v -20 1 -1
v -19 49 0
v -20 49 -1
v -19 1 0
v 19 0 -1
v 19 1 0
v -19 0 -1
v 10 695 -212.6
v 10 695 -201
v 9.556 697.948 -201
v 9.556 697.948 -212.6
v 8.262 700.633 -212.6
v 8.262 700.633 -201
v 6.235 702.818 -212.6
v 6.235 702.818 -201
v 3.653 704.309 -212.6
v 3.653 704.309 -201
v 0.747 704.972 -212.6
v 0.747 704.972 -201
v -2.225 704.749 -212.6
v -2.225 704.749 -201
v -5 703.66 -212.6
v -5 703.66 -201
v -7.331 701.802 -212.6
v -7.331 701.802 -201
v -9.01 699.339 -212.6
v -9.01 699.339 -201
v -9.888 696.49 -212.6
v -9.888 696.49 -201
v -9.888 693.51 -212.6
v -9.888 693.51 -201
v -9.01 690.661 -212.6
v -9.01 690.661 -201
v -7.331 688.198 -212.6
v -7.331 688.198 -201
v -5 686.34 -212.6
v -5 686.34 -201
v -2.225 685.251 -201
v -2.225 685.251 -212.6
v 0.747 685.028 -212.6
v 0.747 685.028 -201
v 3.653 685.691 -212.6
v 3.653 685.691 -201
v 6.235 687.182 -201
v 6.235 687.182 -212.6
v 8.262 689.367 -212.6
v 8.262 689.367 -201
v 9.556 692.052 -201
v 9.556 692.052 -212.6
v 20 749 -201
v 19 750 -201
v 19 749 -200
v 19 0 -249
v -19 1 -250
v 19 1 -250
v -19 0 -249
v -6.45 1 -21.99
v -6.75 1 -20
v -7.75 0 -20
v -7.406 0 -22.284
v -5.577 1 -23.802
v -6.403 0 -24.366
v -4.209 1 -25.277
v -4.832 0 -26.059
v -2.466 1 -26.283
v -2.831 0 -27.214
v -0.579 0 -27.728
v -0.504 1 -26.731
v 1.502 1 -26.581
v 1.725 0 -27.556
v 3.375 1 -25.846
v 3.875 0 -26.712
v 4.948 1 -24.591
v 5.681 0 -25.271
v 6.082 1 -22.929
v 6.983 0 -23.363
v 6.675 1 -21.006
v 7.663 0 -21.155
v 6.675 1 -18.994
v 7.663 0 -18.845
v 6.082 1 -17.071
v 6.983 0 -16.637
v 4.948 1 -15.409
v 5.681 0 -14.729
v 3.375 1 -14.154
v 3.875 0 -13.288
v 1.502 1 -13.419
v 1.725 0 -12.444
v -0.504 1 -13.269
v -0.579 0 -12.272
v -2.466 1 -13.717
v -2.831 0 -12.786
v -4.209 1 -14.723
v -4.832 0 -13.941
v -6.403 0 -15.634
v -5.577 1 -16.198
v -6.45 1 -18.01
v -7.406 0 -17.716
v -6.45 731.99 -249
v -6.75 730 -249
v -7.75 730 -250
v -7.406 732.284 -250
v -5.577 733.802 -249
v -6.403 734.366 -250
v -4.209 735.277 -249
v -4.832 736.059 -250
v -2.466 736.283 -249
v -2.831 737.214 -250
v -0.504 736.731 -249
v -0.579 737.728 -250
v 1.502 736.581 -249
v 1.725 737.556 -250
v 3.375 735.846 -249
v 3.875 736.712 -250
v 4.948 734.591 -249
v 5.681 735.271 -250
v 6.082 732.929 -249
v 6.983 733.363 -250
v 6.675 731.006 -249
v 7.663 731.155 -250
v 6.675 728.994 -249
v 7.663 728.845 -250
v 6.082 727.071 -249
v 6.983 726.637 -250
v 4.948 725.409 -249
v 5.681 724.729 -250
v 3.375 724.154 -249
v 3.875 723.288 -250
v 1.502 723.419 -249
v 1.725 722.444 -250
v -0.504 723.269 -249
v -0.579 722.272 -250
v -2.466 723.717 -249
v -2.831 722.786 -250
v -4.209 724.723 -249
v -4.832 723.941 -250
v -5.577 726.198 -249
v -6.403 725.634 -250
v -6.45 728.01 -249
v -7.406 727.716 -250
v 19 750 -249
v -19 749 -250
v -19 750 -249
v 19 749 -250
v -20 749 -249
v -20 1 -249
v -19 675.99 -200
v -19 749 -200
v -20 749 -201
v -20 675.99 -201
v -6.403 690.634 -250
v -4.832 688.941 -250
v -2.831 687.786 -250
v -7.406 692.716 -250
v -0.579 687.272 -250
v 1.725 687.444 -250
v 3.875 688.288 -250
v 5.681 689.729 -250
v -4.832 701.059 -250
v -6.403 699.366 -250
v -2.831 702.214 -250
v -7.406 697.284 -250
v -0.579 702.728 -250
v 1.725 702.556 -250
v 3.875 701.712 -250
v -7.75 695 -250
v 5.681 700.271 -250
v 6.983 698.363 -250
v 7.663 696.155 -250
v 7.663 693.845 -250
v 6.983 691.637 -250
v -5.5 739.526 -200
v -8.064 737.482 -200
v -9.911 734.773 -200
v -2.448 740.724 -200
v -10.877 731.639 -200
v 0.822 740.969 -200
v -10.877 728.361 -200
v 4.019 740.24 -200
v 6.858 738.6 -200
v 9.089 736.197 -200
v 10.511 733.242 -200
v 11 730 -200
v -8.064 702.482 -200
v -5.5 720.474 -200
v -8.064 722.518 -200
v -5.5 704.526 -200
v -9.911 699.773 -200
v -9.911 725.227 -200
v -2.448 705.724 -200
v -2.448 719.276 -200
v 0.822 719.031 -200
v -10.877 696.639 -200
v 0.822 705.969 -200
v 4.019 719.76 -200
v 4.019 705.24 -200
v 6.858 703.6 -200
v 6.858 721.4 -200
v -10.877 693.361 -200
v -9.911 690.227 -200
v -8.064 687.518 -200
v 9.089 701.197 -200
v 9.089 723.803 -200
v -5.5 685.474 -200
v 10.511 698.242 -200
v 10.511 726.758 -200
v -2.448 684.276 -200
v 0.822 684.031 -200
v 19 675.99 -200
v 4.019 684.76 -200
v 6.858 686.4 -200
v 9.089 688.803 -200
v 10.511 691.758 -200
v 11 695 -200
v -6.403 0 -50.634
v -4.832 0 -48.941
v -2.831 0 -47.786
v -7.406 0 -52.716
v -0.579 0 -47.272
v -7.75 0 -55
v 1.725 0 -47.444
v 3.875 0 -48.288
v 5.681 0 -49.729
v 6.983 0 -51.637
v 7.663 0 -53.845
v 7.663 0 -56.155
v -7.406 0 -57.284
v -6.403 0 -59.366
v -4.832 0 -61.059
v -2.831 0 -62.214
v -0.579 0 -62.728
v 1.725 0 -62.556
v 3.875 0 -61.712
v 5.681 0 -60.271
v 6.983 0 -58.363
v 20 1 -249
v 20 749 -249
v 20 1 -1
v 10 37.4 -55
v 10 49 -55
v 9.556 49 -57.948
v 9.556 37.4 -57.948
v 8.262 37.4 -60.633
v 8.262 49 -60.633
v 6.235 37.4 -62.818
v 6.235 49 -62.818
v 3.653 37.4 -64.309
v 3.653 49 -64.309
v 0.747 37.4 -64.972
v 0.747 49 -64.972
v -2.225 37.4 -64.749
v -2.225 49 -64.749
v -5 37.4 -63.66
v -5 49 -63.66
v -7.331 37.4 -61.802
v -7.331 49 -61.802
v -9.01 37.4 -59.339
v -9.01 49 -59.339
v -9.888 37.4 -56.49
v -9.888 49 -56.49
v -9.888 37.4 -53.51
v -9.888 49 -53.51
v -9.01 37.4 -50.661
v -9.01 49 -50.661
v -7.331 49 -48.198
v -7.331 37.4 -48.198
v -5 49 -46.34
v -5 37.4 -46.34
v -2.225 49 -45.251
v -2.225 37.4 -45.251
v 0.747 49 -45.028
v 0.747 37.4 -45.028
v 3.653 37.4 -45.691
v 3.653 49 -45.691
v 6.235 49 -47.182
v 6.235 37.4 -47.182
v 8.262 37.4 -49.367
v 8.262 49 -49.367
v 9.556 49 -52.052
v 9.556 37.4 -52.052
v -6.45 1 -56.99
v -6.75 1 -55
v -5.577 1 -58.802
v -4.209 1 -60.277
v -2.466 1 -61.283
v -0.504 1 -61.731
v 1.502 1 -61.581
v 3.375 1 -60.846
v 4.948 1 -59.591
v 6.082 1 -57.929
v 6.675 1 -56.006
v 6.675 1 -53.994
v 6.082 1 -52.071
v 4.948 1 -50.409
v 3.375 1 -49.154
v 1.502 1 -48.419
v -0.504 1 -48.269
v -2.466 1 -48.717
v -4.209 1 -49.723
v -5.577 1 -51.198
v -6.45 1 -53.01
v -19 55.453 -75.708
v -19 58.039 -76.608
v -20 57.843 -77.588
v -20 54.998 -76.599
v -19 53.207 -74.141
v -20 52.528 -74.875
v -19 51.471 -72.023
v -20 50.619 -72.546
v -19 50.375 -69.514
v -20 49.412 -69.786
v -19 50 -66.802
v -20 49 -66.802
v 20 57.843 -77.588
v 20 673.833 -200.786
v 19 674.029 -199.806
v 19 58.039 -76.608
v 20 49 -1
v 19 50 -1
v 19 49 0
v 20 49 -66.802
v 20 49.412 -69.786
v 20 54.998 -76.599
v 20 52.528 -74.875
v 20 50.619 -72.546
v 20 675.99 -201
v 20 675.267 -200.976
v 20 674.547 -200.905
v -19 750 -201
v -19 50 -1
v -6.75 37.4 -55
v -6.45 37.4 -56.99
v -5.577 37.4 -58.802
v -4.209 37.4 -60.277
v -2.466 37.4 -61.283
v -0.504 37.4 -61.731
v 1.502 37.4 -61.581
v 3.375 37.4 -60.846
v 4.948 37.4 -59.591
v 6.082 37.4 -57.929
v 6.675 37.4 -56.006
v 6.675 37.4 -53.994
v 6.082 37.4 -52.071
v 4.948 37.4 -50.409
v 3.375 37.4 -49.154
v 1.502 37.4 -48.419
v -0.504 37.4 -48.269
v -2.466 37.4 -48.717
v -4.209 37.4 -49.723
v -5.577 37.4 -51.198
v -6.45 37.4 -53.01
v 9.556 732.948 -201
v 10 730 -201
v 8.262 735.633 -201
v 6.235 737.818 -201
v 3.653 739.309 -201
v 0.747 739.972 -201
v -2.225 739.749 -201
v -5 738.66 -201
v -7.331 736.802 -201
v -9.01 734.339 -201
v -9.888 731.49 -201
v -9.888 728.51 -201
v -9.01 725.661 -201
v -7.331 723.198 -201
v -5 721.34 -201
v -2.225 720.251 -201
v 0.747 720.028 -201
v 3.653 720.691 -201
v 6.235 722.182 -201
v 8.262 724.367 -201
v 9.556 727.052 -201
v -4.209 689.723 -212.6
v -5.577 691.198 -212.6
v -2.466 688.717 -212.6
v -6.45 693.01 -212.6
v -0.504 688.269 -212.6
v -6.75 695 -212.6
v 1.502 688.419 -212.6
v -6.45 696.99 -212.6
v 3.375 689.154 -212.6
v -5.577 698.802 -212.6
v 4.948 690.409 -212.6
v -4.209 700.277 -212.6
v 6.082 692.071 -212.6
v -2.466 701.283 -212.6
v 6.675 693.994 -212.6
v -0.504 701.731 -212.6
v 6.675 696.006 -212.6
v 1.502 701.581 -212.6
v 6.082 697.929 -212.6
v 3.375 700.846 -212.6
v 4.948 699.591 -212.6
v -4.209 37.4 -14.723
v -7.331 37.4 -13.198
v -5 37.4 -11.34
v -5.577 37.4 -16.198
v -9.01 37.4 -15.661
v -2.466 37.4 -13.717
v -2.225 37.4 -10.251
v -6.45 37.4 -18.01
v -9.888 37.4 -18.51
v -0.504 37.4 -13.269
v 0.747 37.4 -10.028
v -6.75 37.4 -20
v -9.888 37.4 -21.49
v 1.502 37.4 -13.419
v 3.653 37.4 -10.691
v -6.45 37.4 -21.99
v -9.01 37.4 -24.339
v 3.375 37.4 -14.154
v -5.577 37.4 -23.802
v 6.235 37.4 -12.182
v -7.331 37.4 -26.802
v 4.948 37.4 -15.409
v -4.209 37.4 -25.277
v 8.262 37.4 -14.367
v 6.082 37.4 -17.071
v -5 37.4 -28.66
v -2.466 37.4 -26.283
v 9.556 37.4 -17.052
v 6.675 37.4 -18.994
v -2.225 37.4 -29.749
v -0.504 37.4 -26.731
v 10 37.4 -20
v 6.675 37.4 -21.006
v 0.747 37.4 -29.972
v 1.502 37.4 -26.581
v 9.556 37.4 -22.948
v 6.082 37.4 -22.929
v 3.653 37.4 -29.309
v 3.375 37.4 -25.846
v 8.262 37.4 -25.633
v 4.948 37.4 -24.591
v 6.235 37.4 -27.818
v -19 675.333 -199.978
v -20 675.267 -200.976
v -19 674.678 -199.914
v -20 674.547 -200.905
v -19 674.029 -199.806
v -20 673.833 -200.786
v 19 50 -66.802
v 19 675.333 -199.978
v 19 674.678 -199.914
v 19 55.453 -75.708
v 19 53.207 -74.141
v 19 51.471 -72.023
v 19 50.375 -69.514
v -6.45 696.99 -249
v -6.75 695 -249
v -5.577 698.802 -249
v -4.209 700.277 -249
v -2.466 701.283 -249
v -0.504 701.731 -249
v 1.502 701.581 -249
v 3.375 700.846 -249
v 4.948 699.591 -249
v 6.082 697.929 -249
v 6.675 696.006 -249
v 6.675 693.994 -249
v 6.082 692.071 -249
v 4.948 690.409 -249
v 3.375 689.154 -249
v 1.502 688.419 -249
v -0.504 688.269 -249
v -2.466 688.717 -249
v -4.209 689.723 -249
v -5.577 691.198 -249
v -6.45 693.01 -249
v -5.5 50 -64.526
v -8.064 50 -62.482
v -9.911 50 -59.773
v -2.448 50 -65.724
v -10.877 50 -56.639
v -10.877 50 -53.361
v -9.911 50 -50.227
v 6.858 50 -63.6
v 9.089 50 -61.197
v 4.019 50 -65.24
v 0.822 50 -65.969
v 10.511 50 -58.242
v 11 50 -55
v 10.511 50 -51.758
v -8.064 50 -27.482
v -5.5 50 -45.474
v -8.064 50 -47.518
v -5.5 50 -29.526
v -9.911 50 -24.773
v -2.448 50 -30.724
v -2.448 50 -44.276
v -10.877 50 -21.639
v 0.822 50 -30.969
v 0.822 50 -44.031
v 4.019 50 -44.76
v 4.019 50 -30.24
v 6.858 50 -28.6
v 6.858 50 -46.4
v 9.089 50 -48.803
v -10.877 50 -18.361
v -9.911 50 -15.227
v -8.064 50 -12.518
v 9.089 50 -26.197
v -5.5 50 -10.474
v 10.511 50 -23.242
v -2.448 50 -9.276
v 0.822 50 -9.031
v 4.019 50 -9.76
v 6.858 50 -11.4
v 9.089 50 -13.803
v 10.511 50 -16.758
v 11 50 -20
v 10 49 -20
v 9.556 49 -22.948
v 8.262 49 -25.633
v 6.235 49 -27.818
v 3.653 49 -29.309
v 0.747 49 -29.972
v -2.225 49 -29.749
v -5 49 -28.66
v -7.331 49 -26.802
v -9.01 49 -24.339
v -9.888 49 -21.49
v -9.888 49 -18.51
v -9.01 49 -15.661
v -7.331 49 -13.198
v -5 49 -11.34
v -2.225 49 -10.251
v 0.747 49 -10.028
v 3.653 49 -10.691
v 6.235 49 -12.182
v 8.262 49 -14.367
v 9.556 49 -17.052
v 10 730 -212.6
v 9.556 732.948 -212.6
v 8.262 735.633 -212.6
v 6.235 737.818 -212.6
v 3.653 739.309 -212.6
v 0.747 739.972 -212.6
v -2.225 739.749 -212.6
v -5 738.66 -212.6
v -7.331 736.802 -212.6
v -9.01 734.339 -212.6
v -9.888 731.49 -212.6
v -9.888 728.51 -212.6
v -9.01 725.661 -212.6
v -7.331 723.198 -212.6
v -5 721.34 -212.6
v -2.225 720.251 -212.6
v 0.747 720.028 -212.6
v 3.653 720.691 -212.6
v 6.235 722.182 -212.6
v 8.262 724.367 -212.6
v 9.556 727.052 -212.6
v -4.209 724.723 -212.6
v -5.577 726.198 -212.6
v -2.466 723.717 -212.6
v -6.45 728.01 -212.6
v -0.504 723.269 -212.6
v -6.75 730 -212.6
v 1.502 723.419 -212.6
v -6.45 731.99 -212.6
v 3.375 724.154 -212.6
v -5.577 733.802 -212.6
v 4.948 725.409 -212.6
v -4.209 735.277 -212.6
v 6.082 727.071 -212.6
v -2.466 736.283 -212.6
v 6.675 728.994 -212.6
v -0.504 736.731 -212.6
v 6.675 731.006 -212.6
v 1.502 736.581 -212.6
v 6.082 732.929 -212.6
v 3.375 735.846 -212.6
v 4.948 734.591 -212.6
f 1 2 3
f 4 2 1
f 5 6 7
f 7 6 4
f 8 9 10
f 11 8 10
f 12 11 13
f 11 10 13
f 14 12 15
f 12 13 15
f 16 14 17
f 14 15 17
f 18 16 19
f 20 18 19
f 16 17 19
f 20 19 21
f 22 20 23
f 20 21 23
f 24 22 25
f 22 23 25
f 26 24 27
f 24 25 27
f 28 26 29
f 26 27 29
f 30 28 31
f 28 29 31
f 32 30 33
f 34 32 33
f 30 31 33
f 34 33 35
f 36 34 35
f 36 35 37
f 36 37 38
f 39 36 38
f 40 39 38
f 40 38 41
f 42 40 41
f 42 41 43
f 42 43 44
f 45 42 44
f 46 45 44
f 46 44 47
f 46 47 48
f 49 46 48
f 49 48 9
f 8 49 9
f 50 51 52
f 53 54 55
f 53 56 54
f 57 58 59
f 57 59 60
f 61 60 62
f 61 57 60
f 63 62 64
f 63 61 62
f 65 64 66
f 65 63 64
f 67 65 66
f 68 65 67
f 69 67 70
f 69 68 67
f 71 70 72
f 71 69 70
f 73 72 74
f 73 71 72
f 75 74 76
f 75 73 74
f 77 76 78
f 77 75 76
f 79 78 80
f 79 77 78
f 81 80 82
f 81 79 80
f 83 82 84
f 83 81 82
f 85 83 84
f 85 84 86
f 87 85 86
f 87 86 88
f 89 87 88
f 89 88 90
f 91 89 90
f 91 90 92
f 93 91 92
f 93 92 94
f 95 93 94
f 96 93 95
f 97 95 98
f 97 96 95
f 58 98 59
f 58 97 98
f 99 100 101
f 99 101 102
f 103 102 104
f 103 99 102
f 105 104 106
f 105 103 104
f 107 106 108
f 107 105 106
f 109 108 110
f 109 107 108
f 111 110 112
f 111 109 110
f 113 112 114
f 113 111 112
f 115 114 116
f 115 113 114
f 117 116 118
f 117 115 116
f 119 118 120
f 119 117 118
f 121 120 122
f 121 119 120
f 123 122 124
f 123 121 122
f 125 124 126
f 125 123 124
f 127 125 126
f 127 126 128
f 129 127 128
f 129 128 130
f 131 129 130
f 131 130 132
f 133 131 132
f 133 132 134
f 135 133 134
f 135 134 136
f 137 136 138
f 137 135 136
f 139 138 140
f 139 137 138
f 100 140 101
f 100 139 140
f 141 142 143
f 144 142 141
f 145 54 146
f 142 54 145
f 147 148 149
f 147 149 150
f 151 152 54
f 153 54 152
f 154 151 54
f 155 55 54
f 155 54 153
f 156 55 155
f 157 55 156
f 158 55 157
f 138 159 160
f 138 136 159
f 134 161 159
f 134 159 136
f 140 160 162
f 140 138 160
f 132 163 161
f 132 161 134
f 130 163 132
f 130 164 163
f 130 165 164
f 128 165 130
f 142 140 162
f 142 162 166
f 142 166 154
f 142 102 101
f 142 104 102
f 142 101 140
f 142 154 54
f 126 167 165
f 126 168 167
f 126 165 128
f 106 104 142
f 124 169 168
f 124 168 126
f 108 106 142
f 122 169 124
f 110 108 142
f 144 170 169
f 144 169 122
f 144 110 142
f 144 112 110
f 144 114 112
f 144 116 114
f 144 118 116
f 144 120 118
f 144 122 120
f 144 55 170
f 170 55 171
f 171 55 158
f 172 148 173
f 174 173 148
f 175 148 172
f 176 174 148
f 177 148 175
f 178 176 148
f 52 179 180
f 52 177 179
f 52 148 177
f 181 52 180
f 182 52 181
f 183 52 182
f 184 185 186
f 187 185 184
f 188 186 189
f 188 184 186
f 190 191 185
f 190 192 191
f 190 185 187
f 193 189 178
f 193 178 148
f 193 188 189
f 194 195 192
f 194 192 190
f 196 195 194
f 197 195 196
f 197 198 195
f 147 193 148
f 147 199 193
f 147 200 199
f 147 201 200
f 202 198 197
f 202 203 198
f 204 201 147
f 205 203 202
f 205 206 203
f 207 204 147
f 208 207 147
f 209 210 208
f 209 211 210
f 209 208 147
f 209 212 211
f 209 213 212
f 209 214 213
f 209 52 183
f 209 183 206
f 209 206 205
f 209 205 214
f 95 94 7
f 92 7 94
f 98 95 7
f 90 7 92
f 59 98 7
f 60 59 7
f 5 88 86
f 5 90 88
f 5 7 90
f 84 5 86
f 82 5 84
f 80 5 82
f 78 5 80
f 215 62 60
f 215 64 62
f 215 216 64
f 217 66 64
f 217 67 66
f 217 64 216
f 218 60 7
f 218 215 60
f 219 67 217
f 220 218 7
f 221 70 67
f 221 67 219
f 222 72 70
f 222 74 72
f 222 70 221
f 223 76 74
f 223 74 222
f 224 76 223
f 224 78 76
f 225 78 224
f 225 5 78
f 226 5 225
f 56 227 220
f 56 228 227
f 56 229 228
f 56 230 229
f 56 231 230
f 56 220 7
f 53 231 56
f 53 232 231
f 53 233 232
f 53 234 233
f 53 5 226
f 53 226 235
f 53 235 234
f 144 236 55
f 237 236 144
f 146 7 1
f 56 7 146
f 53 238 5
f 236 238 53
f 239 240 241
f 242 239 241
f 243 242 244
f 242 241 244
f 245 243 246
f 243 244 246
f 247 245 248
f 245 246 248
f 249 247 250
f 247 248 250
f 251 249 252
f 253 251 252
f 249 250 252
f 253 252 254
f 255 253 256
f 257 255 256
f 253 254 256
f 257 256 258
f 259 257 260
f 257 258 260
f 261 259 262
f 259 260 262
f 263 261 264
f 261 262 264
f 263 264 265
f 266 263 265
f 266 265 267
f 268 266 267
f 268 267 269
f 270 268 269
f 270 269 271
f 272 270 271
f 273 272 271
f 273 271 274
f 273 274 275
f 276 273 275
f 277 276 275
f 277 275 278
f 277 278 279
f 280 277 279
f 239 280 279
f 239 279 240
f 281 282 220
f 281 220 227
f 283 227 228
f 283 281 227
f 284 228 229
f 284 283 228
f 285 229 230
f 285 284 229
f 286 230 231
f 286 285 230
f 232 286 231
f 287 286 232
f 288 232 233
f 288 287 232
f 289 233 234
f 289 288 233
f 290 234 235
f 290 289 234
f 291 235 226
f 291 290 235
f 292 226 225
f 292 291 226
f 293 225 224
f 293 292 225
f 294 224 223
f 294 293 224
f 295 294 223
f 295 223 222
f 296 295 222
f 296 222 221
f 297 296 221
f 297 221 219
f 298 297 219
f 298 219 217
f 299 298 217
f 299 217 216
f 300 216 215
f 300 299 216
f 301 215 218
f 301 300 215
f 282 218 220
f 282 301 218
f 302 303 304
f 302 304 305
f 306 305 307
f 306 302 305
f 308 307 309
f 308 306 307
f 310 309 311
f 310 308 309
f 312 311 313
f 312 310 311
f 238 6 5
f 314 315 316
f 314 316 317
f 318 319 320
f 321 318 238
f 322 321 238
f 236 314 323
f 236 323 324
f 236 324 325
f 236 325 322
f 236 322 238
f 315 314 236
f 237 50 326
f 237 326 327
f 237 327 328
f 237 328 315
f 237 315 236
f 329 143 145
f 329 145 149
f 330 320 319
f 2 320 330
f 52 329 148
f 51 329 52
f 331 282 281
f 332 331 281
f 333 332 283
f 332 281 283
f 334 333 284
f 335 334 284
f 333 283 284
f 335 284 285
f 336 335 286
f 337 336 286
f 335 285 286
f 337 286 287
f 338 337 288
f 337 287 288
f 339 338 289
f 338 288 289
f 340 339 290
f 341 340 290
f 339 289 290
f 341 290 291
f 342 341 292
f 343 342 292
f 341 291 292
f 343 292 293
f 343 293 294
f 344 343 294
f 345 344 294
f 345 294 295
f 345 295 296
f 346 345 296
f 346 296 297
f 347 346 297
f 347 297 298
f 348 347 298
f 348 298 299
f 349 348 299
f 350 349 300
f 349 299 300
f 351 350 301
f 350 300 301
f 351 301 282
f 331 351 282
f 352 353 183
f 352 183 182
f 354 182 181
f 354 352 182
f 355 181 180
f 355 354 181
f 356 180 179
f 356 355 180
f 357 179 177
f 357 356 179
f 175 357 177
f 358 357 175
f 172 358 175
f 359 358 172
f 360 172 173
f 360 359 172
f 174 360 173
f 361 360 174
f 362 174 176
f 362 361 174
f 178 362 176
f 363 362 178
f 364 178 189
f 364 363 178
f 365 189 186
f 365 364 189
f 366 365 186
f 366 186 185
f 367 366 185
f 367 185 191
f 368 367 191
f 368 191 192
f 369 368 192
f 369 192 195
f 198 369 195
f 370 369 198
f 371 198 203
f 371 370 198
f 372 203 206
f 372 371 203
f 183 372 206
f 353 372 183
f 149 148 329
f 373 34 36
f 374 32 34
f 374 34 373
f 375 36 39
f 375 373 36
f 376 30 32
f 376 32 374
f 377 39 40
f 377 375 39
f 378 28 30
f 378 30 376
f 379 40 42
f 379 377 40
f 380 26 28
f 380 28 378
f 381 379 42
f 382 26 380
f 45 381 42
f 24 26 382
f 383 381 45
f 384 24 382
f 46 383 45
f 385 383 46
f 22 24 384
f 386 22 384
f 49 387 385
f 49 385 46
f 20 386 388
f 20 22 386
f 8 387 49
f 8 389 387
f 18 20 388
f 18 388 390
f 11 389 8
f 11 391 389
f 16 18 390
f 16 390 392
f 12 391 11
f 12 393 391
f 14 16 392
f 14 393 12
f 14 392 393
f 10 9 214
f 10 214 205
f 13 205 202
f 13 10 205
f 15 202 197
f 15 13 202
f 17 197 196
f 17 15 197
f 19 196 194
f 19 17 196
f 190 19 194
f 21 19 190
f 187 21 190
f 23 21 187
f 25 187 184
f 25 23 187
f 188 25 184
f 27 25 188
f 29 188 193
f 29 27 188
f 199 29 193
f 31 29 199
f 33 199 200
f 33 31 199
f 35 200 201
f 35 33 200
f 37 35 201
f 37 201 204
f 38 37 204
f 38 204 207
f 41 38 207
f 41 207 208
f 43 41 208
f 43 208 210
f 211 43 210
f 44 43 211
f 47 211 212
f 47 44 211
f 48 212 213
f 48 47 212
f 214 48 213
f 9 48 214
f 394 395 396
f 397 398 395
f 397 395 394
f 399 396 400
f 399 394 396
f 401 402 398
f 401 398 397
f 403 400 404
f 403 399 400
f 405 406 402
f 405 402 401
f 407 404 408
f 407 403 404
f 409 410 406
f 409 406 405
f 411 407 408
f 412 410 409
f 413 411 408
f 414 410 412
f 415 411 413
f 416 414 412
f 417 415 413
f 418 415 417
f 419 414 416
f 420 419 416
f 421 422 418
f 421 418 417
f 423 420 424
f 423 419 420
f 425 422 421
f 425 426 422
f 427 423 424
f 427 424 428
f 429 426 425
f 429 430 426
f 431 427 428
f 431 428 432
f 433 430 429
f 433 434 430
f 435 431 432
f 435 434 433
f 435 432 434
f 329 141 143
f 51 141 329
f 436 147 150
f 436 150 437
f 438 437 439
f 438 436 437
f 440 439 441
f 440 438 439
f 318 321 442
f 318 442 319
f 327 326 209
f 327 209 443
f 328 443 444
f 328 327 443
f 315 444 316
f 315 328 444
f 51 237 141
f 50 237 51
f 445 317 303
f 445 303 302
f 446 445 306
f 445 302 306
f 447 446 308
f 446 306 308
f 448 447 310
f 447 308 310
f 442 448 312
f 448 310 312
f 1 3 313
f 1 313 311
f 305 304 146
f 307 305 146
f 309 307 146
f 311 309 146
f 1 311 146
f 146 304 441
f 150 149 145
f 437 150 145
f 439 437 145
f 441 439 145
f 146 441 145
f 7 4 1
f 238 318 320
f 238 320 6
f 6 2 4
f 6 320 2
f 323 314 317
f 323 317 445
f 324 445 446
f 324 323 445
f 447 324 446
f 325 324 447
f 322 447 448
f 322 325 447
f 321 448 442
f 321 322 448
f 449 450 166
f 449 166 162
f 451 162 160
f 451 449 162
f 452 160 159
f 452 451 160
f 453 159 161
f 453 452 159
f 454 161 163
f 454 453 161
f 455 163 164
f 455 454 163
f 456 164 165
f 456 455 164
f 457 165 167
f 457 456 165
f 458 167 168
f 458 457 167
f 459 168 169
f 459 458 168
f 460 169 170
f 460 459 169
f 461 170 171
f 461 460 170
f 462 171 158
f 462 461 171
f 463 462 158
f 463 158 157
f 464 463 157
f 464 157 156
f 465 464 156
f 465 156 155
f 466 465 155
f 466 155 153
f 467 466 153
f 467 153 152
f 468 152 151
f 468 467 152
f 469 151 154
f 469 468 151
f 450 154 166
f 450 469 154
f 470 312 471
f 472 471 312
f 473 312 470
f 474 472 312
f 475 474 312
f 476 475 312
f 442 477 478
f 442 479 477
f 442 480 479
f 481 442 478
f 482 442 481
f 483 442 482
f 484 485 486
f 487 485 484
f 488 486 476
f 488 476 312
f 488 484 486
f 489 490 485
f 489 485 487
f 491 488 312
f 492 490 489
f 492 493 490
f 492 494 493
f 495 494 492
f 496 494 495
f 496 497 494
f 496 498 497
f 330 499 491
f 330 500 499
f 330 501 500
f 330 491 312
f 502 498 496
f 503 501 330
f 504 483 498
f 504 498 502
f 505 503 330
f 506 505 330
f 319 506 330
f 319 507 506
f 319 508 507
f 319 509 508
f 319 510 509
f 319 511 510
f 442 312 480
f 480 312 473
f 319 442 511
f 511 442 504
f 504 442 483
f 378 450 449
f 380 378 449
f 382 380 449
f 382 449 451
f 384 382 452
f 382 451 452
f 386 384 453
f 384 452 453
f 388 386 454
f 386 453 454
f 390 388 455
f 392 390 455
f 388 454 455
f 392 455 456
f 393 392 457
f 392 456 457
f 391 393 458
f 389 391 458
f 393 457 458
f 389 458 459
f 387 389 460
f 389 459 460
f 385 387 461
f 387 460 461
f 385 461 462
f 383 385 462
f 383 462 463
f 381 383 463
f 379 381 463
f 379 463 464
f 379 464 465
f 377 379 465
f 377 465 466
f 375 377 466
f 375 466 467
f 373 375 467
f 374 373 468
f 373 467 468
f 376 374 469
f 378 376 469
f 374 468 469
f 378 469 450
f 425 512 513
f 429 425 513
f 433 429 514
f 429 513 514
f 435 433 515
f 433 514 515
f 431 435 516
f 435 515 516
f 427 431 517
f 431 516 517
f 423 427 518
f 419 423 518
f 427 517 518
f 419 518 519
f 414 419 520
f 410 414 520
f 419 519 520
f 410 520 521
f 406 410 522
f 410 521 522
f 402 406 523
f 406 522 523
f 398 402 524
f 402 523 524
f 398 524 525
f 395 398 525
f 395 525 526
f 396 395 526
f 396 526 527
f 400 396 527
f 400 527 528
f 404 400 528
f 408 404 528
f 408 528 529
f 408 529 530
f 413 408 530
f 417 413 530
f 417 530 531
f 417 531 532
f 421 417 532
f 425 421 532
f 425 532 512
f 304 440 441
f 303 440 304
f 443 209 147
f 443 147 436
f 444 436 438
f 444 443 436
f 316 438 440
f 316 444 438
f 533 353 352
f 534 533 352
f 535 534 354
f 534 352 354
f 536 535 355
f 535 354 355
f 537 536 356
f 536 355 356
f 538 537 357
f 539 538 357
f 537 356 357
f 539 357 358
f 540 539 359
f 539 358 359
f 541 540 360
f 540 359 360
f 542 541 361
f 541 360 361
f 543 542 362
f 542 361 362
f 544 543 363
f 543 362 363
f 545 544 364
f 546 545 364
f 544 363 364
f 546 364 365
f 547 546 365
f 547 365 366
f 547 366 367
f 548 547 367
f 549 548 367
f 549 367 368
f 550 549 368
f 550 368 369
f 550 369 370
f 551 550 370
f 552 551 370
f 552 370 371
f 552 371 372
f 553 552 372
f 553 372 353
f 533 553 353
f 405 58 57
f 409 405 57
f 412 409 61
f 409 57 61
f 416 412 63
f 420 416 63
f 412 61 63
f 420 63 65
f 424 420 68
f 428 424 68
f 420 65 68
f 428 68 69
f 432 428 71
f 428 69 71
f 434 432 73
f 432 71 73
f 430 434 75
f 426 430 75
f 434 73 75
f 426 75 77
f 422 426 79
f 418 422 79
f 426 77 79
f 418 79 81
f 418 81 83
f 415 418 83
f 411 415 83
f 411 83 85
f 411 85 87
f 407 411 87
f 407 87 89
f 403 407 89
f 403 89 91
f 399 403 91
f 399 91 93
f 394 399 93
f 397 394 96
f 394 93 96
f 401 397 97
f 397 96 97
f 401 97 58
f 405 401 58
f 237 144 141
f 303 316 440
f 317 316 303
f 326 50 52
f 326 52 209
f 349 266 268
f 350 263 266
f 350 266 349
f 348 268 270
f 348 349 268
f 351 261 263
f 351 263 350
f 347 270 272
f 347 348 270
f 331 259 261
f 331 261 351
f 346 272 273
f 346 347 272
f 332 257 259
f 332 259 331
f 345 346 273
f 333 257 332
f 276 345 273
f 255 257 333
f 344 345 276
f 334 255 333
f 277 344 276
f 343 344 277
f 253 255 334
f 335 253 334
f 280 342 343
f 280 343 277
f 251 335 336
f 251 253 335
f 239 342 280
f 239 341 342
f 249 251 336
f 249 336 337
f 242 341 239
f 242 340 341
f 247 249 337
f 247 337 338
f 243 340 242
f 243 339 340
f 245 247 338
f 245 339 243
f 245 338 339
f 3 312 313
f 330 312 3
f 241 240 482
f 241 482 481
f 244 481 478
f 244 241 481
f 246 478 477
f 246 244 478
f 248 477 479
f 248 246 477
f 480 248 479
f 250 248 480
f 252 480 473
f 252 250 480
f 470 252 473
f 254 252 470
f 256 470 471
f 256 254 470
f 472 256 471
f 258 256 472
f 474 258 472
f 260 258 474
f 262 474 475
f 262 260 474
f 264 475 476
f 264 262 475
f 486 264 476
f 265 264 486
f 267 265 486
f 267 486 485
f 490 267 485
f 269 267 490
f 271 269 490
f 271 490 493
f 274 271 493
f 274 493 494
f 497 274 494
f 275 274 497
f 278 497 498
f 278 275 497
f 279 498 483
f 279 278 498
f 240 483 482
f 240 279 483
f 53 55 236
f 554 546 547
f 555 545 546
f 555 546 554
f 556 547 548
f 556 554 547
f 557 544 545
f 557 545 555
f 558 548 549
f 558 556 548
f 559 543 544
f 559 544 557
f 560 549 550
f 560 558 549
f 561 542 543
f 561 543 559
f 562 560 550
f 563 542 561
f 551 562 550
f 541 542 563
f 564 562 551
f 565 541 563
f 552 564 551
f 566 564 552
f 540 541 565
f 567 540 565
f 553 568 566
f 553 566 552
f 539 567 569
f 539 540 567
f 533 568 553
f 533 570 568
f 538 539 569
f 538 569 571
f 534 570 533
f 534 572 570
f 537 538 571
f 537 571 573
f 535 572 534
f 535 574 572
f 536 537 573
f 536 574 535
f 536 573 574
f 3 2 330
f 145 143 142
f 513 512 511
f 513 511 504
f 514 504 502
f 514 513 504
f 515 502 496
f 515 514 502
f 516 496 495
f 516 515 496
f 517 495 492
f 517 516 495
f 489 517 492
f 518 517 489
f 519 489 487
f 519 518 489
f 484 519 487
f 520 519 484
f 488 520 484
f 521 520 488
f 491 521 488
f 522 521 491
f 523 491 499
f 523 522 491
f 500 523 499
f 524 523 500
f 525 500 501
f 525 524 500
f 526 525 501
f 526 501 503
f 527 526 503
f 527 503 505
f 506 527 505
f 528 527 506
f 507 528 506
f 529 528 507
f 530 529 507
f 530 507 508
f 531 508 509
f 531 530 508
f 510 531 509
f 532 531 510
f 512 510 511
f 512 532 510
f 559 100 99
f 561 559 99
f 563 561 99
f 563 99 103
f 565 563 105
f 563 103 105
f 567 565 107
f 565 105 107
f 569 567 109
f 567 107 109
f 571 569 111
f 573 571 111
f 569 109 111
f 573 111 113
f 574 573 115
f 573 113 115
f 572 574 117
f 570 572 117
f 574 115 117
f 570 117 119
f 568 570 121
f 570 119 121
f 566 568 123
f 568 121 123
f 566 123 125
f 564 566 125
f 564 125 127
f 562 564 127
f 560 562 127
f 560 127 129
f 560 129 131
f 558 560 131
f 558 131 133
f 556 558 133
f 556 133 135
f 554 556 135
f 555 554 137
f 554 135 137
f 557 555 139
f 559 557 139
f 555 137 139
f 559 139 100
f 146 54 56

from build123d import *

# Parameters (mm, degrees)
BOSS_EXTRUDE1_DEPTH                                  = 20
CBORE_FOR_M12_HEX_SOCKET_HEAD_CAP_SCREW1_D           = 13.5
CBORE_FOR_M12_HEX_SOCKET_HEAD_CAP_SCREW1_CBORE_D     = 20
CBORE_FOR_M12_HEX_SOCKET_HEAD_CAP_SCREW1_CBORE_DEPTH = 12.6
CBORE_FOR_M12_HEX_SOCKET_HEAD_CAP_SCREW2_D           = 13.5
CBORE_FOR_M12_HEX_SOCKET_HEAD_CAP_SCREW2_CBORE_D     = 20
CBORE_FOR_M12_HEX_SOCKET_HEAD_CAP_SCREW2_CBORE_DEPTH = 12.6
FILLET1_R                                            = 10
CHAMFER1_SIZE                                        = 1
CHAMFER2_SIZE                                        = 1


with BuildPart() as part:
    # Sketch1 → Boss-Extrude1 (new, symmetric)
    with BuildSketch(Plane(origin=(0, 0, 0), x_dir=(0, 0, -1), z_dir=(1, 0, 0))):
        Polygon((0, 0), (250, 0), (250, 750), (200, 750), (200, 675), (75, 50), (0, 50), align=None)
    extrude(amount=BOSS_EXTRUDE1_DEPTH, both=True)

    # CBORE for M12 Hex Socket Head Cap Screw1 (through all)
    with Locations(Plane(origin=(0, 50, 0), x_dir=(1, 0, 0), z_dir=(0, 1, 0))):
        with Locations((0, 55), (0, 20)):
            CounterBoreHole(CBORE_FOR_M12_HEX_SOCKET_HEAD_CAP_SCREW1_D / 2, CBORE_FOR_M12_HEX_SOCKET_HEAD_CAP_SCREW1_CBORE_D / 2, CBORE_FOR_M12_HEX_SOCKET_HEAD_CAP_SCREW1_CBORE_DEPTH)

    # CBORE for M12 Hex Socket Head Cap Screw2 (through all)
    with Locations(Plane.XY.offset(-200)):
        with Locations((0, 730), (0, 695)):
            CounterBoreHole(CBORE_FOR_M12_HEX_SOCKET_HEAD_CAP_SCREW2_D / 2, CBORE_FOR_M12_HEX_SOCKET_HEAD_CAP_SCREW2_CBORE_D / 2, CBORE_FOR_M12_HEX_SOCKET_HEAD_CAP_SCREW2_CBORE_DEPTH)

    # Fillet1
    fillet1_edges = [part.edges().sort_by_distance(p)[0] for p in [
        (0, 50, -75),
        (0, 675, -200),
    ]]
    fillet(fillet1_edges, radius=FILLET1_R)

    # Chamfer1
    chamfer1_edges = [part.edges().sort_by_distance(p)[0] for p in [
        (-20, 25, 0),
        (0, 50, 0),
        (20, 375, -250),
        (0, 750, -200),
        (0, 750, -250),
        (0, 0, -250),
        (0, 0, 0),
        (20, 750, -225),
        (20, 712.995097568, -200),
        (6.75, 0, -20),
        (6.75, 0, -55),
        (6.75, 695, -250),
        (6.75, 730, -250),
        (20, 25, 0),
        (-20, 50, -33.400980486),
        (20, 50, -33.400980486),
        (-20, 366.033936217, -138.206787243),
        (20, 366.033936217, -138.206787243),
        (-20, 52.266578587, -73.141850029),
        (20, 52.266578587, -73.141850029),
        (-20, 675.004818956, -199.951333267),
        (20, 675.004818956, -199.951333267),
        (-20, 712.995097568, -200),
        (-20, 750, -225),
        (20, 0, -125),
        (-20, 375, -250),
        (-20, 0, -125),
    ]]
    chamfer(chamfer1_edges, length=CHAMFER1_SIZE)

    # Chamfer2
    chamfer2_edges = [part.edges().sort_by_distance(p)[0] for p in [
        (-10, 50, -20),
        (-10, 50, -55),
        (-10, 695, -200),
        (-10, 730, -200),
    ]]
    chamfer(chamfer2_edges, length=CHAMFER2_SIZE)


solid = part.part
